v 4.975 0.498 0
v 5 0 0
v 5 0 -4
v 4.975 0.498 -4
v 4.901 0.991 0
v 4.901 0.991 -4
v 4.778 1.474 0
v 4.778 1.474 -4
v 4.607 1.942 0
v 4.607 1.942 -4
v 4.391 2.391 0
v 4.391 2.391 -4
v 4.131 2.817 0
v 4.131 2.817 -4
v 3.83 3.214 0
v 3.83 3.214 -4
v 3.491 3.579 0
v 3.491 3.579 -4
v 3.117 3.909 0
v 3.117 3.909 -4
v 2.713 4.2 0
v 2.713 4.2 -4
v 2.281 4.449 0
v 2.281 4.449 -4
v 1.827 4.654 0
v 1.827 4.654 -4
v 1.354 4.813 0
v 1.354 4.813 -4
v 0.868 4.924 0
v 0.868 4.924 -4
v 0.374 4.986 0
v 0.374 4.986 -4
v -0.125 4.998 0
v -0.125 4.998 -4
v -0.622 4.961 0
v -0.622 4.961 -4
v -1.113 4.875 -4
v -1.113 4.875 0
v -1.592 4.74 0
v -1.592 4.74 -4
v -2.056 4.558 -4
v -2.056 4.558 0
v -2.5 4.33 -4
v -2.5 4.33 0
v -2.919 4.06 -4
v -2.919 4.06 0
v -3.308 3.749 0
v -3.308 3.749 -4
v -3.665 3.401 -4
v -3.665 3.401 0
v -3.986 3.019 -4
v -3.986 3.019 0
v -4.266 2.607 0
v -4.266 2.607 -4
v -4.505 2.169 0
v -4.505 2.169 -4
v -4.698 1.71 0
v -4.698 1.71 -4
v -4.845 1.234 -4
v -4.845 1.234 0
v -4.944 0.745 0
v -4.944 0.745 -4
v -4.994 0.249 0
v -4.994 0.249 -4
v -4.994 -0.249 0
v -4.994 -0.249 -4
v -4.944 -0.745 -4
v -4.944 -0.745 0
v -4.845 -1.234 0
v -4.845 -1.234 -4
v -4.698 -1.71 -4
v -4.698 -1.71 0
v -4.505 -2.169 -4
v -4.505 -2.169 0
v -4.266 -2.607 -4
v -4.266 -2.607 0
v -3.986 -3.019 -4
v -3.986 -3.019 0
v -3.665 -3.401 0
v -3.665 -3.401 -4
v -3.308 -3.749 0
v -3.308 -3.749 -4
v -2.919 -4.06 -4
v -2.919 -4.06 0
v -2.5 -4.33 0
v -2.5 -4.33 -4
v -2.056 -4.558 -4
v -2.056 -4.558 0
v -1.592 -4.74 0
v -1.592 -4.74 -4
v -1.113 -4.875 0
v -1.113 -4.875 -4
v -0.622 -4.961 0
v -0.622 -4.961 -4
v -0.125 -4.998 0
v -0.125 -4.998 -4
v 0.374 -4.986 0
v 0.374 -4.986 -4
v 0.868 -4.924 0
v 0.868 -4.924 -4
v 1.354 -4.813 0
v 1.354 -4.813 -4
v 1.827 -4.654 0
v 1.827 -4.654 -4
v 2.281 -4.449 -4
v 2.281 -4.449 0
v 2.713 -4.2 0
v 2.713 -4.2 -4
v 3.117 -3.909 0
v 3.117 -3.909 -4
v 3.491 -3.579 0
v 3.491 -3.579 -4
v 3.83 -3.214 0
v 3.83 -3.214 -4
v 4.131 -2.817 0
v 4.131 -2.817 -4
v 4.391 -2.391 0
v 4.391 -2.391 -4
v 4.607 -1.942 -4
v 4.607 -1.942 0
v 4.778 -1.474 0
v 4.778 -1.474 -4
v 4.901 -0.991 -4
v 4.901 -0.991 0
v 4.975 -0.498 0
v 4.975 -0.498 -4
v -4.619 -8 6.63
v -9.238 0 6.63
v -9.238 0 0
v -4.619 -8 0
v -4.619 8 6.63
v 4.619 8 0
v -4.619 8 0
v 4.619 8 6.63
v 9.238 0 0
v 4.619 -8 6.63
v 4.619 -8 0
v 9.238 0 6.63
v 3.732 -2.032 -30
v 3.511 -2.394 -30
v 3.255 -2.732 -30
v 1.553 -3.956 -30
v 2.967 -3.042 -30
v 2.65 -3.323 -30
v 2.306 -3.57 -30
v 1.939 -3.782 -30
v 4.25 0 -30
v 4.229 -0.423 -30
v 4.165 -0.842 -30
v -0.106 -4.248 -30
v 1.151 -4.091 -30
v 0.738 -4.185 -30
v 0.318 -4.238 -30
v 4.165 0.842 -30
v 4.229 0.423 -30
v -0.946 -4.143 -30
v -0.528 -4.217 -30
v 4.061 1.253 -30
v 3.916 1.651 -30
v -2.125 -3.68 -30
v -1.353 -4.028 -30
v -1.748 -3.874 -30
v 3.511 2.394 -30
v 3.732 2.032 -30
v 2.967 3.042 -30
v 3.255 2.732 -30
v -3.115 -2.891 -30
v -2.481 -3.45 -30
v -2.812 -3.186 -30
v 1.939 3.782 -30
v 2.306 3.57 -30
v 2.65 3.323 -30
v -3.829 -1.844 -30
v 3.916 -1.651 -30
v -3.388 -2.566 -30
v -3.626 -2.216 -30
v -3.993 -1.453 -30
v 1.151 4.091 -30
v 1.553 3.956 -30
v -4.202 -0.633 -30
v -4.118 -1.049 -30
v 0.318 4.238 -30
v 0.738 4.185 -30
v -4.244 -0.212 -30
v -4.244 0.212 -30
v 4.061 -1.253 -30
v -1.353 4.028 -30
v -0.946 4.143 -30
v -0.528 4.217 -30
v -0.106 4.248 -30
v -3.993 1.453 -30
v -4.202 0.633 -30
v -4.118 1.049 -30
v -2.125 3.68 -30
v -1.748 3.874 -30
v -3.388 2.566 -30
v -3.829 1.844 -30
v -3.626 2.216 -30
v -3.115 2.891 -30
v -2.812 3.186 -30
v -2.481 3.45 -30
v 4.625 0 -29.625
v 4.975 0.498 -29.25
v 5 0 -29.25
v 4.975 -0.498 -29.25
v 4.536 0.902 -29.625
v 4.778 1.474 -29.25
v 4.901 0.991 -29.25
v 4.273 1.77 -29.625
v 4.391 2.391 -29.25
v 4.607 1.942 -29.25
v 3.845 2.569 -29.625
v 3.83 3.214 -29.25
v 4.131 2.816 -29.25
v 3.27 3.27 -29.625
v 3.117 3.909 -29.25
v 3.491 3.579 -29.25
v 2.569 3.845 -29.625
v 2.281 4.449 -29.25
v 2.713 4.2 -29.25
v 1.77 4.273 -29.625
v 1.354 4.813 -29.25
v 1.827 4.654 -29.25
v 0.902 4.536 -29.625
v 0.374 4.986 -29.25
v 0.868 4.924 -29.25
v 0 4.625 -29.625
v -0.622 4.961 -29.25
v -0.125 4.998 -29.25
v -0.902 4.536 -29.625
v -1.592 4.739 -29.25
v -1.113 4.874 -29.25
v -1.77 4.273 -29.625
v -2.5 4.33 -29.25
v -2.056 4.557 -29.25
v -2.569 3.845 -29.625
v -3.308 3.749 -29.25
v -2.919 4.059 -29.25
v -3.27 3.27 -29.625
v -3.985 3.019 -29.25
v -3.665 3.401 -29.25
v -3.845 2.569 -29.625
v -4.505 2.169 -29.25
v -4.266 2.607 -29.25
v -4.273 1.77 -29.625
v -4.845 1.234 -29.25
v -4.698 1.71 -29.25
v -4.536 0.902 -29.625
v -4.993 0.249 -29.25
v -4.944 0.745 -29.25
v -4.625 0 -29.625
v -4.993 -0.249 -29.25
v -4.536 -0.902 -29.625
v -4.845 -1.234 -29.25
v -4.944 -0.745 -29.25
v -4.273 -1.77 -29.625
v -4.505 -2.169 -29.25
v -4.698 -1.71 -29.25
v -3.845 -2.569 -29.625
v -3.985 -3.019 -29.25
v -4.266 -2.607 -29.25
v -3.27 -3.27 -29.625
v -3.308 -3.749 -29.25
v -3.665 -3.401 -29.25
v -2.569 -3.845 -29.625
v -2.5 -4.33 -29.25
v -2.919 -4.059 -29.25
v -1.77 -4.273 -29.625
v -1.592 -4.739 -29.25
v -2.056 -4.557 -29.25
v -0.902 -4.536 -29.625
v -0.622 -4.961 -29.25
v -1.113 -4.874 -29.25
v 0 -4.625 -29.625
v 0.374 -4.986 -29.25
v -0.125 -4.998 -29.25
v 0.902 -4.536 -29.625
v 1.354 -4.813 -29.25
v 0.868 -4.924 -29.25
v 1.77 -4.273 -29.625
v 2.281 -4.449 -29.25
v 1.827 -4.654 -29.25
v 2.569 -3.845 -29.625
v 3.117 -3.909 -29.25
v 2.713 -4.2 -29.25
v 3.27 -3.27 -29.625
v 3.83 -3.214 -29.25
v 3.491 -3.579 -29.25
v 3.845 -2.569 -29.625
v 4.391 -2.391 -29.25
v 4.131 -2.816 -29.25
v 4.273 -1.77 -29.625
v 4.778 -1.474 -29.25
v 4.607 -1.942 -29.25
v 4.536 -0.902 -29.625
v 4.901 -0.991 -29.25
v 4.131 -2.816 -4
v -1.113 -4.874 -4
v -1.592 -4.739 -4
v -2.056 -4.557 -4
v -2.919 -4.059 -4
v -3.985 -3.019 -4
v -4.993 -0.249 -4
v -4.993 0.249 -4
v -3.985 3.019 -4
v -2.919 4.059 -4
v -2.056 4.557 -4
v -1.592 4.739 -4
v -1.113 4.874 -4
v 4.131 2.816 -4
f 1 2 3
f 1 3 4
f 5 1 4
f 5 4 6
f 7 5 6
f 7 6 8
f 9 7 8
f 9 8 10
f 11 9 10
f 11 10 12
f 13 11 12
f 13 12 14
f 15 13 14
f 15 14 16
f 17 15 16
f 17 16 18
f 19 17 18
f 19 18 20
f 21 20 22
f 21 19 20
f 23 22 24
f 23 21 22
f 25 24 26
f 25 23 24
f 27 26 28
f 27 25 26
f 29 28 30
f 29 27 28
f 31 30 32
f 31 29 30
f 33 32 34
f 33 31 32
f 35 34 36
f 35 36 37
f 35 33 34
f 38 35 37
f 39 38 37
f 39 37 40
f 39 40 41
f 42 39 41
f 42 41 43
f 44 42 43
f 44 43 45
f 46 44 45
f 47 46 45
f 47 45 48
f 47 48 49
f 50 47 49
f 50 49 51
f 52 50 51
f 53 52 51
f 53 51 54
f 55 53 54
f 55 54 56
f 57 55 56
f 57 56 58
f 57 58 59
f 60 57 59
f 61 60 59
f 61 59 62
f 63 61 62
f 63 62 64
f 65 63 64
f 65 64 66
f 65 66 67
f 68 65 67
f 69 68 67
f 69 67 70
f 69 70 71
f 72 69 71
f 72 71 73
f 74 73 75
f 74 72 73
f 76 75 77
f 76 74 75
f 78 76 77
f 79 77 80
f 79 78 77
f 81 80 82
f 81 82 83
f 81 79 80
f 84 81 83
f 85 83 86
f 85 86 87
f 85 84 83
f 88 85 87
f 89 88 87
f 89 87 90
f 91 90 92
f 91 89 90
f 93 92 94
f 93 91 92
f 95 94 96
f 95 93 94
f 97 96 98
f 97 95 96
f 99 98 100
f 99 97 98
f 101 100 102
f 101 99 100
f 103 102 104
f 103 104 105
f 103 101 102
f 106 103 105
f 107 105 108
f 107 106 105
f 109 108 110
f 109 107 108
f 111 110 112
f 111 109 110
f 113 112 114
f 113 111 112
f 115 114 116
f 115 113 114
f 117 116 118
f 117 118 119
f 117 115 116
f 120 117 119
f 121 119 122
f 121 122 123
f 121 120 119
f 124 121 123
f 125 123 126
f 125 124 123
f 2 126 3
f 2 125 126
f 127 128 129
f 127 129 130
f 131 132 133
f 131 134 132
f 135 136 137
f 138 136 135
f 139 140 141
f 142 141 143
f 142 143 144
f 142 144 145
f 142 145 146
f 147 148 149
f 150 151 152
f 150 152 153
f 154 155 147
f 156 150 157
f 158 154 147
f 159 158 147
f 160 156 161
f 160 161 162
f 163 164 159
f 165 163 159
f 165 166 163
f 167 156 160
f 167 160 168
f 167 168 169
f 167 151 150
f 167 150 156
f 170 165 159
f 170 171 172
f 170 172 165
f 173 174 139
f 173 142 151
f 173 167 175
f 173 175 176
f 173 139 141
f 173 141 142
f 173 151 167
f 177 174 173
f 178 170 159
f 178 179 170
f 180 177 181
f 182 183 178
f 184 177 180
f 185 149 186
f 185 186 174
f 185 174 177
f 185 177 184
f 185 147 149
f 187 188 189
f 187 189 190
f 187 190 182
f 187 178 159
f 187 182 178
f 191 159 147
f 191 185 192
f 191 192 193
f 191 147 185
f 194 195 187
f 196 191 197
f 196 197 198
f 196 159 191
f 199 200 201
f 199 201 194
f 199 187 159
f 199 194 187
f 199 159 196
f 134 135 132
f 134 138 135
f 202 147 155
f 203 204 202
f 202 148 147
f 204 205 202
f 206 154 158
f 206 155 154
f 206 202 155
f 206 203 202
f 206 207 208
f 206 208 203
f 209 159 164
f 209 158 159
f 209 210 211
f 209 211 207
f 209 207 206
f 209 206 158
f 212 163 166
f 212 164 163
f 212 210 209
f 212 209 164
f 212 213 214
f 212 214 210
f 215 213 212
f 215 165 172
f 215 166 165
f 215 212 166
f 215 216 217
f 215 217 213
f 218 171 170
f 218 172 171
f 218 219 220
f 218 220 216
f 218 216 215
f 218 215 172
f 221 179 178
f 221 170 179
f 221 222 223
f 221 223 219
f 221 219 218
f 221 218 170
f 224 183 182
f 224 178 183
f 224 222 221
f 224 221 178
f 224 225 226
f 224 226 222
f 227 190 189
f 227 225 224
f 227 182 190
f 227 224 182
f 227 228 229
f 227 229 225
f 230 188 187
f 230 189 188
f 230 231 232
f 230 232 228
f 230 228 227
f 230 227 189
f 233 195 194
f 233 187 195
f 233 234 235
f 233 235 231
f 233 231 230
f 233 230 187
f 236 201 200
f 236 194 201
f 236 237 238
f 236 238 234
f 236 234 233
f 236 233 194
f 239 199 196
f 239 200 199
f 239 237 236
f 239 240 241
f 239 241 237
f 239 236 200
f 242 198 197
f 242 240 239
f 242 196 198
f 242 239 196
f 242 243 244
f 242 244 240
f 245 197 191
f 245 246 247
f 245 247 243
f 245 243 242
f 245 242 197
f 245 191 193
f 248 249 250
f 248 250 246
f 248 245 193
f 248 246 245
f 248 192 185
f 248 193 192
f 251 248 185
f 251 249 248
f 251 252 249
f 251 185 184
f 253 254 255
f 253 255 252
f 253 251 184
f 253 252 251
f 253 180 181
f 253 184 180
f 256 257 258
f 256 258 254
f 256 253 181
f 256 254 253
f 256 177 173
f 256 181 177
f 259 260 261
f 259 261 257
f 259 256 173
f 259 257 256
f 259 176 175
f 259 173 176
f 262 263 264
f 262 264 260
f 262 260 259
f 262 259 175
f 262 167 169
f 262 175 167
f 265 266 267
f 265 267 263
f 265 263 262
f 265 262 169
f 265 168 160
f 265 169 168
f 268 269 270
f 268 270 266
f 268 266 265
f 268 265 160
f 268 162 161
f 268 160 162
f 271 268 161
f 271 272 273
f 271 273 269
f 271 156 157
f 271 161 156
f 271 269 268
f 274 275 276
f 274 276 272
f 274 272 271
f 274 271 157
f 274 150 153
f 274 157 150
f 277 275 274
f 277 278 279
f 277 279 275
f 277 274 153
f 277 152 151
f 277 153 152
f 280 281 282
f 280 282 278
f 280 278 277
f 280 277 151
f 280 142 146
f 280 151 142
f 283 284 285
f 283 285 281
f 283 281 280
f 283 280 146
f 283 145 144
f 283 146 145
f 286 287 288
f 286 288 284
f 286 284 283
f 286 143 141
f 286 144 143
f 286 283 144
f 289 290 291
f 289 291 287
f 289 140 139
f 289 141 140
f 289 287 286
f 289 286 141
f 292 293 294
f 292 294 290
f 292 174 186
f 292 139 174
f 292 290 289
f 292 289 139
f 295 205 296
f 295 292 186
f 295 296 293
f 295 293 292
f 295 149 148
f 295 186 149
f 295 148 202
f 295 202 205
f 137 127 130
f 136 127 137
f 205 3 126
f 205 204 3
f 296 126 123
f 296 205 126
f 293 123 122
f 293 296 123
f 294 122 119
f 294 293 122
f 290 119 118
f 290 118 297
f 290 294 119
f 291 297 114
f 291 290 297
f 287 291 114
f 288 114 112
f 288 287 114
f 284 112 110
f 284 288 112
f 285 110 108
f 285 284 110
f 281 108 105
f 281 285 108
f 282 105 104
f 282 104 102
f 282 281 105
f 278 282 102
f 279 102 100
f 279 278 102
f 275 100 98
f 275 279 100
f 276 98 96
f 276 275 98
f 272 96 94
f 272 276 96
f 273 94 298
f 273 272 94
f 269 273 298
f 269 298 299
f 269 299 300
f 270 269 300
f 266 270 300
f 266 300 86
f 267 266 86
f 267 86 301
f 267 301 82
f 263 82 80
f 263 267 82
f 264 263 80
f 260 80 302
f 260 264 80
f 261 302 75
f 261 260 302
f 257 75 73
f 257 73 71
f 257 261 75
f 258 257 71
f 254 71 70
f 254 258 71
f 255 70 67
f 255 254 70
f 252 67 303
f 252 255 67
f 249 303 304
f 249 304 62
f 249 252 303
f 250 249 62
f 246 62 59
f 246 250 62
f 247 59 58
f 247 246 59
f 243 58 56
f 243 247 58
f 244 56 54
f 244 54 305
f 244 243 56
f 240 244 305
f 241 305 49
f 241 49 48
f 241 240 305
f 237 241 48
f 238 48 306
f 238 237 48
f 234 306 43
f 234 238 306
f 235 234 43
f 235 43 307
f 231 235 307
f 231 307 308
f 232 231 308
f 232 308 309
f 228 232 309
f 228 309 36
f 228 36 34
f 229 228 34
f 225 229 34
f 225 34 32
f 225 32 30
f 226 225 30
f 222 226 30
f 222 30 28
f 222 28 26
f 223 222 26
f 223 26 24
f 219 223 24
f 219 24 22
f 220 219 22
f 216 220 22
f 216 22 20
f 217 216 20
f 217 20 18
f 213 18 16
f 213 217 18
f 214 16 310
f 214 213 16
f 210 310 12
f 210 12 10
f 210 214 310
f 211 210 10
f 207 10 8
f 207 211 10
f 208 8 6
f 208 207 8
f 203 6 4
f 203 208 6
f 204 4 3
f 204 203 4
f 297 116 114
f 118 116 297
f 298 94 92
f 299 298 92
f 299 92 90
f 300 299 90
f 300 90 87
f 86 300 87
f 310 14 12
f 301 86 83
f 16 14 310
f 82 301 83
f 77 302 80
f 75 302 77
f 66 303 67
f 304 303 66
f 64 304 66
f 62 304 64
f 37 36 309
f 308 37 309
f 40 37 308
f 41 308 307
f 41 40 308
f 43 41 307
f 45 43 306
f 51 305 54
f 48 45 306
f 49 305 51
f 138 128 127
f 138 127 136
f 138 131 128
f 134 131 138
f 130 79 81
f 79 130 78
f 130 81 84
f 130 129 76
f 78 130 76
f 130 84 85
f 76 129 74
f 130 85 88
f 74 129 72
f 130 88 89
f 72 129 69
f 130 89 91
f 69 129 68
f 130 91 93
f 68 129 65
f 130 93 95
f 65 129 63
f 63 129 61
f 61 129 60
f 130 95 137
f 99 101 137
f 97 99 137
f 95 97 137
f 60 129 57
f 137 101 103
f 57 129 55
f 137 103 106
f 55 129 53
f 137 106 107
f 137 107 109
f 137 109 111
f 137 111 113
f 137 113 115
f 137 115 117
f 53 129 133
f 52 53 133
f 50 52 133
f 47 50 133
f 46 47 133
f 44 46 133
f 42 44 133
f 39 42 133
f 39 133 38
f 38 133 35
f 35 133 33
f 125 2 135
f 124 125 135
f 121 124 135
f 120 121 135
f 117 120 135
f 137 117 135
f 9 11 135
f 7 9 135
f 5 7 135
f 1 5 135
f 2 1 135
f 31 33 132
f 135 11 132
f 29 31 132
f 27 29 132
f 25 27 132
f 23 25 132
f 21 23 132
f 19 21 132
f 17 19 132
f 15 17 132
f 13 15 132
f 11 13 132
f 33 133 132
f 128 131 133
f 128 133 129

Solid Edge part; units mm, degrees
sketch "Sketch1" plane through (0, 0, 0) normal (0, 0, 1) x (1, 0, 0)
  circle A0 centre (0, 0) radius 9.28
  dimension "D1" = 18.56
extrude "Protrusion1" add sketch "Sketch1" along normal blind 6.63
sketch "Sketch2" plane through (0, 0, 0) normal (0, 0, -1) x (1, 0, 0)
  circle A0 centre (0, 0) radius 5
extrude "Protrusion2" add sketch "Sketch2" along normal blind 30
sketch "Sketch3" plane through (0, 0, -30) normal (0, 0, -1) x (1, 0, 0)
  circle A0 centre (0, 0) radius 4.9997
extrude "Cutout1" cut sketch "Sketch3" against normal blind 26 flip side to cut
chamfer "Chamfer_1" distance 0.75 angle 45 1 edges at (-4.9997, 0, -30)
sketch "Sketch4" plane through (0, 0, 6.63) normal (0, 0, 1) x (1, 0, 0)
  line L0 (-4.703, 8) -> (4.703, 8)
  dimension "D1" = 16
extrude "Cutout2" cut sketch "Sketch4" against normal up to next material side at (0, 8.05, 6.63)
pattern_circular "Pattern1" count 6 over 360 about axis through (0, 0, 6.63) along (0, 0, 1) of "Cutout2"
properties part number "24101206"
